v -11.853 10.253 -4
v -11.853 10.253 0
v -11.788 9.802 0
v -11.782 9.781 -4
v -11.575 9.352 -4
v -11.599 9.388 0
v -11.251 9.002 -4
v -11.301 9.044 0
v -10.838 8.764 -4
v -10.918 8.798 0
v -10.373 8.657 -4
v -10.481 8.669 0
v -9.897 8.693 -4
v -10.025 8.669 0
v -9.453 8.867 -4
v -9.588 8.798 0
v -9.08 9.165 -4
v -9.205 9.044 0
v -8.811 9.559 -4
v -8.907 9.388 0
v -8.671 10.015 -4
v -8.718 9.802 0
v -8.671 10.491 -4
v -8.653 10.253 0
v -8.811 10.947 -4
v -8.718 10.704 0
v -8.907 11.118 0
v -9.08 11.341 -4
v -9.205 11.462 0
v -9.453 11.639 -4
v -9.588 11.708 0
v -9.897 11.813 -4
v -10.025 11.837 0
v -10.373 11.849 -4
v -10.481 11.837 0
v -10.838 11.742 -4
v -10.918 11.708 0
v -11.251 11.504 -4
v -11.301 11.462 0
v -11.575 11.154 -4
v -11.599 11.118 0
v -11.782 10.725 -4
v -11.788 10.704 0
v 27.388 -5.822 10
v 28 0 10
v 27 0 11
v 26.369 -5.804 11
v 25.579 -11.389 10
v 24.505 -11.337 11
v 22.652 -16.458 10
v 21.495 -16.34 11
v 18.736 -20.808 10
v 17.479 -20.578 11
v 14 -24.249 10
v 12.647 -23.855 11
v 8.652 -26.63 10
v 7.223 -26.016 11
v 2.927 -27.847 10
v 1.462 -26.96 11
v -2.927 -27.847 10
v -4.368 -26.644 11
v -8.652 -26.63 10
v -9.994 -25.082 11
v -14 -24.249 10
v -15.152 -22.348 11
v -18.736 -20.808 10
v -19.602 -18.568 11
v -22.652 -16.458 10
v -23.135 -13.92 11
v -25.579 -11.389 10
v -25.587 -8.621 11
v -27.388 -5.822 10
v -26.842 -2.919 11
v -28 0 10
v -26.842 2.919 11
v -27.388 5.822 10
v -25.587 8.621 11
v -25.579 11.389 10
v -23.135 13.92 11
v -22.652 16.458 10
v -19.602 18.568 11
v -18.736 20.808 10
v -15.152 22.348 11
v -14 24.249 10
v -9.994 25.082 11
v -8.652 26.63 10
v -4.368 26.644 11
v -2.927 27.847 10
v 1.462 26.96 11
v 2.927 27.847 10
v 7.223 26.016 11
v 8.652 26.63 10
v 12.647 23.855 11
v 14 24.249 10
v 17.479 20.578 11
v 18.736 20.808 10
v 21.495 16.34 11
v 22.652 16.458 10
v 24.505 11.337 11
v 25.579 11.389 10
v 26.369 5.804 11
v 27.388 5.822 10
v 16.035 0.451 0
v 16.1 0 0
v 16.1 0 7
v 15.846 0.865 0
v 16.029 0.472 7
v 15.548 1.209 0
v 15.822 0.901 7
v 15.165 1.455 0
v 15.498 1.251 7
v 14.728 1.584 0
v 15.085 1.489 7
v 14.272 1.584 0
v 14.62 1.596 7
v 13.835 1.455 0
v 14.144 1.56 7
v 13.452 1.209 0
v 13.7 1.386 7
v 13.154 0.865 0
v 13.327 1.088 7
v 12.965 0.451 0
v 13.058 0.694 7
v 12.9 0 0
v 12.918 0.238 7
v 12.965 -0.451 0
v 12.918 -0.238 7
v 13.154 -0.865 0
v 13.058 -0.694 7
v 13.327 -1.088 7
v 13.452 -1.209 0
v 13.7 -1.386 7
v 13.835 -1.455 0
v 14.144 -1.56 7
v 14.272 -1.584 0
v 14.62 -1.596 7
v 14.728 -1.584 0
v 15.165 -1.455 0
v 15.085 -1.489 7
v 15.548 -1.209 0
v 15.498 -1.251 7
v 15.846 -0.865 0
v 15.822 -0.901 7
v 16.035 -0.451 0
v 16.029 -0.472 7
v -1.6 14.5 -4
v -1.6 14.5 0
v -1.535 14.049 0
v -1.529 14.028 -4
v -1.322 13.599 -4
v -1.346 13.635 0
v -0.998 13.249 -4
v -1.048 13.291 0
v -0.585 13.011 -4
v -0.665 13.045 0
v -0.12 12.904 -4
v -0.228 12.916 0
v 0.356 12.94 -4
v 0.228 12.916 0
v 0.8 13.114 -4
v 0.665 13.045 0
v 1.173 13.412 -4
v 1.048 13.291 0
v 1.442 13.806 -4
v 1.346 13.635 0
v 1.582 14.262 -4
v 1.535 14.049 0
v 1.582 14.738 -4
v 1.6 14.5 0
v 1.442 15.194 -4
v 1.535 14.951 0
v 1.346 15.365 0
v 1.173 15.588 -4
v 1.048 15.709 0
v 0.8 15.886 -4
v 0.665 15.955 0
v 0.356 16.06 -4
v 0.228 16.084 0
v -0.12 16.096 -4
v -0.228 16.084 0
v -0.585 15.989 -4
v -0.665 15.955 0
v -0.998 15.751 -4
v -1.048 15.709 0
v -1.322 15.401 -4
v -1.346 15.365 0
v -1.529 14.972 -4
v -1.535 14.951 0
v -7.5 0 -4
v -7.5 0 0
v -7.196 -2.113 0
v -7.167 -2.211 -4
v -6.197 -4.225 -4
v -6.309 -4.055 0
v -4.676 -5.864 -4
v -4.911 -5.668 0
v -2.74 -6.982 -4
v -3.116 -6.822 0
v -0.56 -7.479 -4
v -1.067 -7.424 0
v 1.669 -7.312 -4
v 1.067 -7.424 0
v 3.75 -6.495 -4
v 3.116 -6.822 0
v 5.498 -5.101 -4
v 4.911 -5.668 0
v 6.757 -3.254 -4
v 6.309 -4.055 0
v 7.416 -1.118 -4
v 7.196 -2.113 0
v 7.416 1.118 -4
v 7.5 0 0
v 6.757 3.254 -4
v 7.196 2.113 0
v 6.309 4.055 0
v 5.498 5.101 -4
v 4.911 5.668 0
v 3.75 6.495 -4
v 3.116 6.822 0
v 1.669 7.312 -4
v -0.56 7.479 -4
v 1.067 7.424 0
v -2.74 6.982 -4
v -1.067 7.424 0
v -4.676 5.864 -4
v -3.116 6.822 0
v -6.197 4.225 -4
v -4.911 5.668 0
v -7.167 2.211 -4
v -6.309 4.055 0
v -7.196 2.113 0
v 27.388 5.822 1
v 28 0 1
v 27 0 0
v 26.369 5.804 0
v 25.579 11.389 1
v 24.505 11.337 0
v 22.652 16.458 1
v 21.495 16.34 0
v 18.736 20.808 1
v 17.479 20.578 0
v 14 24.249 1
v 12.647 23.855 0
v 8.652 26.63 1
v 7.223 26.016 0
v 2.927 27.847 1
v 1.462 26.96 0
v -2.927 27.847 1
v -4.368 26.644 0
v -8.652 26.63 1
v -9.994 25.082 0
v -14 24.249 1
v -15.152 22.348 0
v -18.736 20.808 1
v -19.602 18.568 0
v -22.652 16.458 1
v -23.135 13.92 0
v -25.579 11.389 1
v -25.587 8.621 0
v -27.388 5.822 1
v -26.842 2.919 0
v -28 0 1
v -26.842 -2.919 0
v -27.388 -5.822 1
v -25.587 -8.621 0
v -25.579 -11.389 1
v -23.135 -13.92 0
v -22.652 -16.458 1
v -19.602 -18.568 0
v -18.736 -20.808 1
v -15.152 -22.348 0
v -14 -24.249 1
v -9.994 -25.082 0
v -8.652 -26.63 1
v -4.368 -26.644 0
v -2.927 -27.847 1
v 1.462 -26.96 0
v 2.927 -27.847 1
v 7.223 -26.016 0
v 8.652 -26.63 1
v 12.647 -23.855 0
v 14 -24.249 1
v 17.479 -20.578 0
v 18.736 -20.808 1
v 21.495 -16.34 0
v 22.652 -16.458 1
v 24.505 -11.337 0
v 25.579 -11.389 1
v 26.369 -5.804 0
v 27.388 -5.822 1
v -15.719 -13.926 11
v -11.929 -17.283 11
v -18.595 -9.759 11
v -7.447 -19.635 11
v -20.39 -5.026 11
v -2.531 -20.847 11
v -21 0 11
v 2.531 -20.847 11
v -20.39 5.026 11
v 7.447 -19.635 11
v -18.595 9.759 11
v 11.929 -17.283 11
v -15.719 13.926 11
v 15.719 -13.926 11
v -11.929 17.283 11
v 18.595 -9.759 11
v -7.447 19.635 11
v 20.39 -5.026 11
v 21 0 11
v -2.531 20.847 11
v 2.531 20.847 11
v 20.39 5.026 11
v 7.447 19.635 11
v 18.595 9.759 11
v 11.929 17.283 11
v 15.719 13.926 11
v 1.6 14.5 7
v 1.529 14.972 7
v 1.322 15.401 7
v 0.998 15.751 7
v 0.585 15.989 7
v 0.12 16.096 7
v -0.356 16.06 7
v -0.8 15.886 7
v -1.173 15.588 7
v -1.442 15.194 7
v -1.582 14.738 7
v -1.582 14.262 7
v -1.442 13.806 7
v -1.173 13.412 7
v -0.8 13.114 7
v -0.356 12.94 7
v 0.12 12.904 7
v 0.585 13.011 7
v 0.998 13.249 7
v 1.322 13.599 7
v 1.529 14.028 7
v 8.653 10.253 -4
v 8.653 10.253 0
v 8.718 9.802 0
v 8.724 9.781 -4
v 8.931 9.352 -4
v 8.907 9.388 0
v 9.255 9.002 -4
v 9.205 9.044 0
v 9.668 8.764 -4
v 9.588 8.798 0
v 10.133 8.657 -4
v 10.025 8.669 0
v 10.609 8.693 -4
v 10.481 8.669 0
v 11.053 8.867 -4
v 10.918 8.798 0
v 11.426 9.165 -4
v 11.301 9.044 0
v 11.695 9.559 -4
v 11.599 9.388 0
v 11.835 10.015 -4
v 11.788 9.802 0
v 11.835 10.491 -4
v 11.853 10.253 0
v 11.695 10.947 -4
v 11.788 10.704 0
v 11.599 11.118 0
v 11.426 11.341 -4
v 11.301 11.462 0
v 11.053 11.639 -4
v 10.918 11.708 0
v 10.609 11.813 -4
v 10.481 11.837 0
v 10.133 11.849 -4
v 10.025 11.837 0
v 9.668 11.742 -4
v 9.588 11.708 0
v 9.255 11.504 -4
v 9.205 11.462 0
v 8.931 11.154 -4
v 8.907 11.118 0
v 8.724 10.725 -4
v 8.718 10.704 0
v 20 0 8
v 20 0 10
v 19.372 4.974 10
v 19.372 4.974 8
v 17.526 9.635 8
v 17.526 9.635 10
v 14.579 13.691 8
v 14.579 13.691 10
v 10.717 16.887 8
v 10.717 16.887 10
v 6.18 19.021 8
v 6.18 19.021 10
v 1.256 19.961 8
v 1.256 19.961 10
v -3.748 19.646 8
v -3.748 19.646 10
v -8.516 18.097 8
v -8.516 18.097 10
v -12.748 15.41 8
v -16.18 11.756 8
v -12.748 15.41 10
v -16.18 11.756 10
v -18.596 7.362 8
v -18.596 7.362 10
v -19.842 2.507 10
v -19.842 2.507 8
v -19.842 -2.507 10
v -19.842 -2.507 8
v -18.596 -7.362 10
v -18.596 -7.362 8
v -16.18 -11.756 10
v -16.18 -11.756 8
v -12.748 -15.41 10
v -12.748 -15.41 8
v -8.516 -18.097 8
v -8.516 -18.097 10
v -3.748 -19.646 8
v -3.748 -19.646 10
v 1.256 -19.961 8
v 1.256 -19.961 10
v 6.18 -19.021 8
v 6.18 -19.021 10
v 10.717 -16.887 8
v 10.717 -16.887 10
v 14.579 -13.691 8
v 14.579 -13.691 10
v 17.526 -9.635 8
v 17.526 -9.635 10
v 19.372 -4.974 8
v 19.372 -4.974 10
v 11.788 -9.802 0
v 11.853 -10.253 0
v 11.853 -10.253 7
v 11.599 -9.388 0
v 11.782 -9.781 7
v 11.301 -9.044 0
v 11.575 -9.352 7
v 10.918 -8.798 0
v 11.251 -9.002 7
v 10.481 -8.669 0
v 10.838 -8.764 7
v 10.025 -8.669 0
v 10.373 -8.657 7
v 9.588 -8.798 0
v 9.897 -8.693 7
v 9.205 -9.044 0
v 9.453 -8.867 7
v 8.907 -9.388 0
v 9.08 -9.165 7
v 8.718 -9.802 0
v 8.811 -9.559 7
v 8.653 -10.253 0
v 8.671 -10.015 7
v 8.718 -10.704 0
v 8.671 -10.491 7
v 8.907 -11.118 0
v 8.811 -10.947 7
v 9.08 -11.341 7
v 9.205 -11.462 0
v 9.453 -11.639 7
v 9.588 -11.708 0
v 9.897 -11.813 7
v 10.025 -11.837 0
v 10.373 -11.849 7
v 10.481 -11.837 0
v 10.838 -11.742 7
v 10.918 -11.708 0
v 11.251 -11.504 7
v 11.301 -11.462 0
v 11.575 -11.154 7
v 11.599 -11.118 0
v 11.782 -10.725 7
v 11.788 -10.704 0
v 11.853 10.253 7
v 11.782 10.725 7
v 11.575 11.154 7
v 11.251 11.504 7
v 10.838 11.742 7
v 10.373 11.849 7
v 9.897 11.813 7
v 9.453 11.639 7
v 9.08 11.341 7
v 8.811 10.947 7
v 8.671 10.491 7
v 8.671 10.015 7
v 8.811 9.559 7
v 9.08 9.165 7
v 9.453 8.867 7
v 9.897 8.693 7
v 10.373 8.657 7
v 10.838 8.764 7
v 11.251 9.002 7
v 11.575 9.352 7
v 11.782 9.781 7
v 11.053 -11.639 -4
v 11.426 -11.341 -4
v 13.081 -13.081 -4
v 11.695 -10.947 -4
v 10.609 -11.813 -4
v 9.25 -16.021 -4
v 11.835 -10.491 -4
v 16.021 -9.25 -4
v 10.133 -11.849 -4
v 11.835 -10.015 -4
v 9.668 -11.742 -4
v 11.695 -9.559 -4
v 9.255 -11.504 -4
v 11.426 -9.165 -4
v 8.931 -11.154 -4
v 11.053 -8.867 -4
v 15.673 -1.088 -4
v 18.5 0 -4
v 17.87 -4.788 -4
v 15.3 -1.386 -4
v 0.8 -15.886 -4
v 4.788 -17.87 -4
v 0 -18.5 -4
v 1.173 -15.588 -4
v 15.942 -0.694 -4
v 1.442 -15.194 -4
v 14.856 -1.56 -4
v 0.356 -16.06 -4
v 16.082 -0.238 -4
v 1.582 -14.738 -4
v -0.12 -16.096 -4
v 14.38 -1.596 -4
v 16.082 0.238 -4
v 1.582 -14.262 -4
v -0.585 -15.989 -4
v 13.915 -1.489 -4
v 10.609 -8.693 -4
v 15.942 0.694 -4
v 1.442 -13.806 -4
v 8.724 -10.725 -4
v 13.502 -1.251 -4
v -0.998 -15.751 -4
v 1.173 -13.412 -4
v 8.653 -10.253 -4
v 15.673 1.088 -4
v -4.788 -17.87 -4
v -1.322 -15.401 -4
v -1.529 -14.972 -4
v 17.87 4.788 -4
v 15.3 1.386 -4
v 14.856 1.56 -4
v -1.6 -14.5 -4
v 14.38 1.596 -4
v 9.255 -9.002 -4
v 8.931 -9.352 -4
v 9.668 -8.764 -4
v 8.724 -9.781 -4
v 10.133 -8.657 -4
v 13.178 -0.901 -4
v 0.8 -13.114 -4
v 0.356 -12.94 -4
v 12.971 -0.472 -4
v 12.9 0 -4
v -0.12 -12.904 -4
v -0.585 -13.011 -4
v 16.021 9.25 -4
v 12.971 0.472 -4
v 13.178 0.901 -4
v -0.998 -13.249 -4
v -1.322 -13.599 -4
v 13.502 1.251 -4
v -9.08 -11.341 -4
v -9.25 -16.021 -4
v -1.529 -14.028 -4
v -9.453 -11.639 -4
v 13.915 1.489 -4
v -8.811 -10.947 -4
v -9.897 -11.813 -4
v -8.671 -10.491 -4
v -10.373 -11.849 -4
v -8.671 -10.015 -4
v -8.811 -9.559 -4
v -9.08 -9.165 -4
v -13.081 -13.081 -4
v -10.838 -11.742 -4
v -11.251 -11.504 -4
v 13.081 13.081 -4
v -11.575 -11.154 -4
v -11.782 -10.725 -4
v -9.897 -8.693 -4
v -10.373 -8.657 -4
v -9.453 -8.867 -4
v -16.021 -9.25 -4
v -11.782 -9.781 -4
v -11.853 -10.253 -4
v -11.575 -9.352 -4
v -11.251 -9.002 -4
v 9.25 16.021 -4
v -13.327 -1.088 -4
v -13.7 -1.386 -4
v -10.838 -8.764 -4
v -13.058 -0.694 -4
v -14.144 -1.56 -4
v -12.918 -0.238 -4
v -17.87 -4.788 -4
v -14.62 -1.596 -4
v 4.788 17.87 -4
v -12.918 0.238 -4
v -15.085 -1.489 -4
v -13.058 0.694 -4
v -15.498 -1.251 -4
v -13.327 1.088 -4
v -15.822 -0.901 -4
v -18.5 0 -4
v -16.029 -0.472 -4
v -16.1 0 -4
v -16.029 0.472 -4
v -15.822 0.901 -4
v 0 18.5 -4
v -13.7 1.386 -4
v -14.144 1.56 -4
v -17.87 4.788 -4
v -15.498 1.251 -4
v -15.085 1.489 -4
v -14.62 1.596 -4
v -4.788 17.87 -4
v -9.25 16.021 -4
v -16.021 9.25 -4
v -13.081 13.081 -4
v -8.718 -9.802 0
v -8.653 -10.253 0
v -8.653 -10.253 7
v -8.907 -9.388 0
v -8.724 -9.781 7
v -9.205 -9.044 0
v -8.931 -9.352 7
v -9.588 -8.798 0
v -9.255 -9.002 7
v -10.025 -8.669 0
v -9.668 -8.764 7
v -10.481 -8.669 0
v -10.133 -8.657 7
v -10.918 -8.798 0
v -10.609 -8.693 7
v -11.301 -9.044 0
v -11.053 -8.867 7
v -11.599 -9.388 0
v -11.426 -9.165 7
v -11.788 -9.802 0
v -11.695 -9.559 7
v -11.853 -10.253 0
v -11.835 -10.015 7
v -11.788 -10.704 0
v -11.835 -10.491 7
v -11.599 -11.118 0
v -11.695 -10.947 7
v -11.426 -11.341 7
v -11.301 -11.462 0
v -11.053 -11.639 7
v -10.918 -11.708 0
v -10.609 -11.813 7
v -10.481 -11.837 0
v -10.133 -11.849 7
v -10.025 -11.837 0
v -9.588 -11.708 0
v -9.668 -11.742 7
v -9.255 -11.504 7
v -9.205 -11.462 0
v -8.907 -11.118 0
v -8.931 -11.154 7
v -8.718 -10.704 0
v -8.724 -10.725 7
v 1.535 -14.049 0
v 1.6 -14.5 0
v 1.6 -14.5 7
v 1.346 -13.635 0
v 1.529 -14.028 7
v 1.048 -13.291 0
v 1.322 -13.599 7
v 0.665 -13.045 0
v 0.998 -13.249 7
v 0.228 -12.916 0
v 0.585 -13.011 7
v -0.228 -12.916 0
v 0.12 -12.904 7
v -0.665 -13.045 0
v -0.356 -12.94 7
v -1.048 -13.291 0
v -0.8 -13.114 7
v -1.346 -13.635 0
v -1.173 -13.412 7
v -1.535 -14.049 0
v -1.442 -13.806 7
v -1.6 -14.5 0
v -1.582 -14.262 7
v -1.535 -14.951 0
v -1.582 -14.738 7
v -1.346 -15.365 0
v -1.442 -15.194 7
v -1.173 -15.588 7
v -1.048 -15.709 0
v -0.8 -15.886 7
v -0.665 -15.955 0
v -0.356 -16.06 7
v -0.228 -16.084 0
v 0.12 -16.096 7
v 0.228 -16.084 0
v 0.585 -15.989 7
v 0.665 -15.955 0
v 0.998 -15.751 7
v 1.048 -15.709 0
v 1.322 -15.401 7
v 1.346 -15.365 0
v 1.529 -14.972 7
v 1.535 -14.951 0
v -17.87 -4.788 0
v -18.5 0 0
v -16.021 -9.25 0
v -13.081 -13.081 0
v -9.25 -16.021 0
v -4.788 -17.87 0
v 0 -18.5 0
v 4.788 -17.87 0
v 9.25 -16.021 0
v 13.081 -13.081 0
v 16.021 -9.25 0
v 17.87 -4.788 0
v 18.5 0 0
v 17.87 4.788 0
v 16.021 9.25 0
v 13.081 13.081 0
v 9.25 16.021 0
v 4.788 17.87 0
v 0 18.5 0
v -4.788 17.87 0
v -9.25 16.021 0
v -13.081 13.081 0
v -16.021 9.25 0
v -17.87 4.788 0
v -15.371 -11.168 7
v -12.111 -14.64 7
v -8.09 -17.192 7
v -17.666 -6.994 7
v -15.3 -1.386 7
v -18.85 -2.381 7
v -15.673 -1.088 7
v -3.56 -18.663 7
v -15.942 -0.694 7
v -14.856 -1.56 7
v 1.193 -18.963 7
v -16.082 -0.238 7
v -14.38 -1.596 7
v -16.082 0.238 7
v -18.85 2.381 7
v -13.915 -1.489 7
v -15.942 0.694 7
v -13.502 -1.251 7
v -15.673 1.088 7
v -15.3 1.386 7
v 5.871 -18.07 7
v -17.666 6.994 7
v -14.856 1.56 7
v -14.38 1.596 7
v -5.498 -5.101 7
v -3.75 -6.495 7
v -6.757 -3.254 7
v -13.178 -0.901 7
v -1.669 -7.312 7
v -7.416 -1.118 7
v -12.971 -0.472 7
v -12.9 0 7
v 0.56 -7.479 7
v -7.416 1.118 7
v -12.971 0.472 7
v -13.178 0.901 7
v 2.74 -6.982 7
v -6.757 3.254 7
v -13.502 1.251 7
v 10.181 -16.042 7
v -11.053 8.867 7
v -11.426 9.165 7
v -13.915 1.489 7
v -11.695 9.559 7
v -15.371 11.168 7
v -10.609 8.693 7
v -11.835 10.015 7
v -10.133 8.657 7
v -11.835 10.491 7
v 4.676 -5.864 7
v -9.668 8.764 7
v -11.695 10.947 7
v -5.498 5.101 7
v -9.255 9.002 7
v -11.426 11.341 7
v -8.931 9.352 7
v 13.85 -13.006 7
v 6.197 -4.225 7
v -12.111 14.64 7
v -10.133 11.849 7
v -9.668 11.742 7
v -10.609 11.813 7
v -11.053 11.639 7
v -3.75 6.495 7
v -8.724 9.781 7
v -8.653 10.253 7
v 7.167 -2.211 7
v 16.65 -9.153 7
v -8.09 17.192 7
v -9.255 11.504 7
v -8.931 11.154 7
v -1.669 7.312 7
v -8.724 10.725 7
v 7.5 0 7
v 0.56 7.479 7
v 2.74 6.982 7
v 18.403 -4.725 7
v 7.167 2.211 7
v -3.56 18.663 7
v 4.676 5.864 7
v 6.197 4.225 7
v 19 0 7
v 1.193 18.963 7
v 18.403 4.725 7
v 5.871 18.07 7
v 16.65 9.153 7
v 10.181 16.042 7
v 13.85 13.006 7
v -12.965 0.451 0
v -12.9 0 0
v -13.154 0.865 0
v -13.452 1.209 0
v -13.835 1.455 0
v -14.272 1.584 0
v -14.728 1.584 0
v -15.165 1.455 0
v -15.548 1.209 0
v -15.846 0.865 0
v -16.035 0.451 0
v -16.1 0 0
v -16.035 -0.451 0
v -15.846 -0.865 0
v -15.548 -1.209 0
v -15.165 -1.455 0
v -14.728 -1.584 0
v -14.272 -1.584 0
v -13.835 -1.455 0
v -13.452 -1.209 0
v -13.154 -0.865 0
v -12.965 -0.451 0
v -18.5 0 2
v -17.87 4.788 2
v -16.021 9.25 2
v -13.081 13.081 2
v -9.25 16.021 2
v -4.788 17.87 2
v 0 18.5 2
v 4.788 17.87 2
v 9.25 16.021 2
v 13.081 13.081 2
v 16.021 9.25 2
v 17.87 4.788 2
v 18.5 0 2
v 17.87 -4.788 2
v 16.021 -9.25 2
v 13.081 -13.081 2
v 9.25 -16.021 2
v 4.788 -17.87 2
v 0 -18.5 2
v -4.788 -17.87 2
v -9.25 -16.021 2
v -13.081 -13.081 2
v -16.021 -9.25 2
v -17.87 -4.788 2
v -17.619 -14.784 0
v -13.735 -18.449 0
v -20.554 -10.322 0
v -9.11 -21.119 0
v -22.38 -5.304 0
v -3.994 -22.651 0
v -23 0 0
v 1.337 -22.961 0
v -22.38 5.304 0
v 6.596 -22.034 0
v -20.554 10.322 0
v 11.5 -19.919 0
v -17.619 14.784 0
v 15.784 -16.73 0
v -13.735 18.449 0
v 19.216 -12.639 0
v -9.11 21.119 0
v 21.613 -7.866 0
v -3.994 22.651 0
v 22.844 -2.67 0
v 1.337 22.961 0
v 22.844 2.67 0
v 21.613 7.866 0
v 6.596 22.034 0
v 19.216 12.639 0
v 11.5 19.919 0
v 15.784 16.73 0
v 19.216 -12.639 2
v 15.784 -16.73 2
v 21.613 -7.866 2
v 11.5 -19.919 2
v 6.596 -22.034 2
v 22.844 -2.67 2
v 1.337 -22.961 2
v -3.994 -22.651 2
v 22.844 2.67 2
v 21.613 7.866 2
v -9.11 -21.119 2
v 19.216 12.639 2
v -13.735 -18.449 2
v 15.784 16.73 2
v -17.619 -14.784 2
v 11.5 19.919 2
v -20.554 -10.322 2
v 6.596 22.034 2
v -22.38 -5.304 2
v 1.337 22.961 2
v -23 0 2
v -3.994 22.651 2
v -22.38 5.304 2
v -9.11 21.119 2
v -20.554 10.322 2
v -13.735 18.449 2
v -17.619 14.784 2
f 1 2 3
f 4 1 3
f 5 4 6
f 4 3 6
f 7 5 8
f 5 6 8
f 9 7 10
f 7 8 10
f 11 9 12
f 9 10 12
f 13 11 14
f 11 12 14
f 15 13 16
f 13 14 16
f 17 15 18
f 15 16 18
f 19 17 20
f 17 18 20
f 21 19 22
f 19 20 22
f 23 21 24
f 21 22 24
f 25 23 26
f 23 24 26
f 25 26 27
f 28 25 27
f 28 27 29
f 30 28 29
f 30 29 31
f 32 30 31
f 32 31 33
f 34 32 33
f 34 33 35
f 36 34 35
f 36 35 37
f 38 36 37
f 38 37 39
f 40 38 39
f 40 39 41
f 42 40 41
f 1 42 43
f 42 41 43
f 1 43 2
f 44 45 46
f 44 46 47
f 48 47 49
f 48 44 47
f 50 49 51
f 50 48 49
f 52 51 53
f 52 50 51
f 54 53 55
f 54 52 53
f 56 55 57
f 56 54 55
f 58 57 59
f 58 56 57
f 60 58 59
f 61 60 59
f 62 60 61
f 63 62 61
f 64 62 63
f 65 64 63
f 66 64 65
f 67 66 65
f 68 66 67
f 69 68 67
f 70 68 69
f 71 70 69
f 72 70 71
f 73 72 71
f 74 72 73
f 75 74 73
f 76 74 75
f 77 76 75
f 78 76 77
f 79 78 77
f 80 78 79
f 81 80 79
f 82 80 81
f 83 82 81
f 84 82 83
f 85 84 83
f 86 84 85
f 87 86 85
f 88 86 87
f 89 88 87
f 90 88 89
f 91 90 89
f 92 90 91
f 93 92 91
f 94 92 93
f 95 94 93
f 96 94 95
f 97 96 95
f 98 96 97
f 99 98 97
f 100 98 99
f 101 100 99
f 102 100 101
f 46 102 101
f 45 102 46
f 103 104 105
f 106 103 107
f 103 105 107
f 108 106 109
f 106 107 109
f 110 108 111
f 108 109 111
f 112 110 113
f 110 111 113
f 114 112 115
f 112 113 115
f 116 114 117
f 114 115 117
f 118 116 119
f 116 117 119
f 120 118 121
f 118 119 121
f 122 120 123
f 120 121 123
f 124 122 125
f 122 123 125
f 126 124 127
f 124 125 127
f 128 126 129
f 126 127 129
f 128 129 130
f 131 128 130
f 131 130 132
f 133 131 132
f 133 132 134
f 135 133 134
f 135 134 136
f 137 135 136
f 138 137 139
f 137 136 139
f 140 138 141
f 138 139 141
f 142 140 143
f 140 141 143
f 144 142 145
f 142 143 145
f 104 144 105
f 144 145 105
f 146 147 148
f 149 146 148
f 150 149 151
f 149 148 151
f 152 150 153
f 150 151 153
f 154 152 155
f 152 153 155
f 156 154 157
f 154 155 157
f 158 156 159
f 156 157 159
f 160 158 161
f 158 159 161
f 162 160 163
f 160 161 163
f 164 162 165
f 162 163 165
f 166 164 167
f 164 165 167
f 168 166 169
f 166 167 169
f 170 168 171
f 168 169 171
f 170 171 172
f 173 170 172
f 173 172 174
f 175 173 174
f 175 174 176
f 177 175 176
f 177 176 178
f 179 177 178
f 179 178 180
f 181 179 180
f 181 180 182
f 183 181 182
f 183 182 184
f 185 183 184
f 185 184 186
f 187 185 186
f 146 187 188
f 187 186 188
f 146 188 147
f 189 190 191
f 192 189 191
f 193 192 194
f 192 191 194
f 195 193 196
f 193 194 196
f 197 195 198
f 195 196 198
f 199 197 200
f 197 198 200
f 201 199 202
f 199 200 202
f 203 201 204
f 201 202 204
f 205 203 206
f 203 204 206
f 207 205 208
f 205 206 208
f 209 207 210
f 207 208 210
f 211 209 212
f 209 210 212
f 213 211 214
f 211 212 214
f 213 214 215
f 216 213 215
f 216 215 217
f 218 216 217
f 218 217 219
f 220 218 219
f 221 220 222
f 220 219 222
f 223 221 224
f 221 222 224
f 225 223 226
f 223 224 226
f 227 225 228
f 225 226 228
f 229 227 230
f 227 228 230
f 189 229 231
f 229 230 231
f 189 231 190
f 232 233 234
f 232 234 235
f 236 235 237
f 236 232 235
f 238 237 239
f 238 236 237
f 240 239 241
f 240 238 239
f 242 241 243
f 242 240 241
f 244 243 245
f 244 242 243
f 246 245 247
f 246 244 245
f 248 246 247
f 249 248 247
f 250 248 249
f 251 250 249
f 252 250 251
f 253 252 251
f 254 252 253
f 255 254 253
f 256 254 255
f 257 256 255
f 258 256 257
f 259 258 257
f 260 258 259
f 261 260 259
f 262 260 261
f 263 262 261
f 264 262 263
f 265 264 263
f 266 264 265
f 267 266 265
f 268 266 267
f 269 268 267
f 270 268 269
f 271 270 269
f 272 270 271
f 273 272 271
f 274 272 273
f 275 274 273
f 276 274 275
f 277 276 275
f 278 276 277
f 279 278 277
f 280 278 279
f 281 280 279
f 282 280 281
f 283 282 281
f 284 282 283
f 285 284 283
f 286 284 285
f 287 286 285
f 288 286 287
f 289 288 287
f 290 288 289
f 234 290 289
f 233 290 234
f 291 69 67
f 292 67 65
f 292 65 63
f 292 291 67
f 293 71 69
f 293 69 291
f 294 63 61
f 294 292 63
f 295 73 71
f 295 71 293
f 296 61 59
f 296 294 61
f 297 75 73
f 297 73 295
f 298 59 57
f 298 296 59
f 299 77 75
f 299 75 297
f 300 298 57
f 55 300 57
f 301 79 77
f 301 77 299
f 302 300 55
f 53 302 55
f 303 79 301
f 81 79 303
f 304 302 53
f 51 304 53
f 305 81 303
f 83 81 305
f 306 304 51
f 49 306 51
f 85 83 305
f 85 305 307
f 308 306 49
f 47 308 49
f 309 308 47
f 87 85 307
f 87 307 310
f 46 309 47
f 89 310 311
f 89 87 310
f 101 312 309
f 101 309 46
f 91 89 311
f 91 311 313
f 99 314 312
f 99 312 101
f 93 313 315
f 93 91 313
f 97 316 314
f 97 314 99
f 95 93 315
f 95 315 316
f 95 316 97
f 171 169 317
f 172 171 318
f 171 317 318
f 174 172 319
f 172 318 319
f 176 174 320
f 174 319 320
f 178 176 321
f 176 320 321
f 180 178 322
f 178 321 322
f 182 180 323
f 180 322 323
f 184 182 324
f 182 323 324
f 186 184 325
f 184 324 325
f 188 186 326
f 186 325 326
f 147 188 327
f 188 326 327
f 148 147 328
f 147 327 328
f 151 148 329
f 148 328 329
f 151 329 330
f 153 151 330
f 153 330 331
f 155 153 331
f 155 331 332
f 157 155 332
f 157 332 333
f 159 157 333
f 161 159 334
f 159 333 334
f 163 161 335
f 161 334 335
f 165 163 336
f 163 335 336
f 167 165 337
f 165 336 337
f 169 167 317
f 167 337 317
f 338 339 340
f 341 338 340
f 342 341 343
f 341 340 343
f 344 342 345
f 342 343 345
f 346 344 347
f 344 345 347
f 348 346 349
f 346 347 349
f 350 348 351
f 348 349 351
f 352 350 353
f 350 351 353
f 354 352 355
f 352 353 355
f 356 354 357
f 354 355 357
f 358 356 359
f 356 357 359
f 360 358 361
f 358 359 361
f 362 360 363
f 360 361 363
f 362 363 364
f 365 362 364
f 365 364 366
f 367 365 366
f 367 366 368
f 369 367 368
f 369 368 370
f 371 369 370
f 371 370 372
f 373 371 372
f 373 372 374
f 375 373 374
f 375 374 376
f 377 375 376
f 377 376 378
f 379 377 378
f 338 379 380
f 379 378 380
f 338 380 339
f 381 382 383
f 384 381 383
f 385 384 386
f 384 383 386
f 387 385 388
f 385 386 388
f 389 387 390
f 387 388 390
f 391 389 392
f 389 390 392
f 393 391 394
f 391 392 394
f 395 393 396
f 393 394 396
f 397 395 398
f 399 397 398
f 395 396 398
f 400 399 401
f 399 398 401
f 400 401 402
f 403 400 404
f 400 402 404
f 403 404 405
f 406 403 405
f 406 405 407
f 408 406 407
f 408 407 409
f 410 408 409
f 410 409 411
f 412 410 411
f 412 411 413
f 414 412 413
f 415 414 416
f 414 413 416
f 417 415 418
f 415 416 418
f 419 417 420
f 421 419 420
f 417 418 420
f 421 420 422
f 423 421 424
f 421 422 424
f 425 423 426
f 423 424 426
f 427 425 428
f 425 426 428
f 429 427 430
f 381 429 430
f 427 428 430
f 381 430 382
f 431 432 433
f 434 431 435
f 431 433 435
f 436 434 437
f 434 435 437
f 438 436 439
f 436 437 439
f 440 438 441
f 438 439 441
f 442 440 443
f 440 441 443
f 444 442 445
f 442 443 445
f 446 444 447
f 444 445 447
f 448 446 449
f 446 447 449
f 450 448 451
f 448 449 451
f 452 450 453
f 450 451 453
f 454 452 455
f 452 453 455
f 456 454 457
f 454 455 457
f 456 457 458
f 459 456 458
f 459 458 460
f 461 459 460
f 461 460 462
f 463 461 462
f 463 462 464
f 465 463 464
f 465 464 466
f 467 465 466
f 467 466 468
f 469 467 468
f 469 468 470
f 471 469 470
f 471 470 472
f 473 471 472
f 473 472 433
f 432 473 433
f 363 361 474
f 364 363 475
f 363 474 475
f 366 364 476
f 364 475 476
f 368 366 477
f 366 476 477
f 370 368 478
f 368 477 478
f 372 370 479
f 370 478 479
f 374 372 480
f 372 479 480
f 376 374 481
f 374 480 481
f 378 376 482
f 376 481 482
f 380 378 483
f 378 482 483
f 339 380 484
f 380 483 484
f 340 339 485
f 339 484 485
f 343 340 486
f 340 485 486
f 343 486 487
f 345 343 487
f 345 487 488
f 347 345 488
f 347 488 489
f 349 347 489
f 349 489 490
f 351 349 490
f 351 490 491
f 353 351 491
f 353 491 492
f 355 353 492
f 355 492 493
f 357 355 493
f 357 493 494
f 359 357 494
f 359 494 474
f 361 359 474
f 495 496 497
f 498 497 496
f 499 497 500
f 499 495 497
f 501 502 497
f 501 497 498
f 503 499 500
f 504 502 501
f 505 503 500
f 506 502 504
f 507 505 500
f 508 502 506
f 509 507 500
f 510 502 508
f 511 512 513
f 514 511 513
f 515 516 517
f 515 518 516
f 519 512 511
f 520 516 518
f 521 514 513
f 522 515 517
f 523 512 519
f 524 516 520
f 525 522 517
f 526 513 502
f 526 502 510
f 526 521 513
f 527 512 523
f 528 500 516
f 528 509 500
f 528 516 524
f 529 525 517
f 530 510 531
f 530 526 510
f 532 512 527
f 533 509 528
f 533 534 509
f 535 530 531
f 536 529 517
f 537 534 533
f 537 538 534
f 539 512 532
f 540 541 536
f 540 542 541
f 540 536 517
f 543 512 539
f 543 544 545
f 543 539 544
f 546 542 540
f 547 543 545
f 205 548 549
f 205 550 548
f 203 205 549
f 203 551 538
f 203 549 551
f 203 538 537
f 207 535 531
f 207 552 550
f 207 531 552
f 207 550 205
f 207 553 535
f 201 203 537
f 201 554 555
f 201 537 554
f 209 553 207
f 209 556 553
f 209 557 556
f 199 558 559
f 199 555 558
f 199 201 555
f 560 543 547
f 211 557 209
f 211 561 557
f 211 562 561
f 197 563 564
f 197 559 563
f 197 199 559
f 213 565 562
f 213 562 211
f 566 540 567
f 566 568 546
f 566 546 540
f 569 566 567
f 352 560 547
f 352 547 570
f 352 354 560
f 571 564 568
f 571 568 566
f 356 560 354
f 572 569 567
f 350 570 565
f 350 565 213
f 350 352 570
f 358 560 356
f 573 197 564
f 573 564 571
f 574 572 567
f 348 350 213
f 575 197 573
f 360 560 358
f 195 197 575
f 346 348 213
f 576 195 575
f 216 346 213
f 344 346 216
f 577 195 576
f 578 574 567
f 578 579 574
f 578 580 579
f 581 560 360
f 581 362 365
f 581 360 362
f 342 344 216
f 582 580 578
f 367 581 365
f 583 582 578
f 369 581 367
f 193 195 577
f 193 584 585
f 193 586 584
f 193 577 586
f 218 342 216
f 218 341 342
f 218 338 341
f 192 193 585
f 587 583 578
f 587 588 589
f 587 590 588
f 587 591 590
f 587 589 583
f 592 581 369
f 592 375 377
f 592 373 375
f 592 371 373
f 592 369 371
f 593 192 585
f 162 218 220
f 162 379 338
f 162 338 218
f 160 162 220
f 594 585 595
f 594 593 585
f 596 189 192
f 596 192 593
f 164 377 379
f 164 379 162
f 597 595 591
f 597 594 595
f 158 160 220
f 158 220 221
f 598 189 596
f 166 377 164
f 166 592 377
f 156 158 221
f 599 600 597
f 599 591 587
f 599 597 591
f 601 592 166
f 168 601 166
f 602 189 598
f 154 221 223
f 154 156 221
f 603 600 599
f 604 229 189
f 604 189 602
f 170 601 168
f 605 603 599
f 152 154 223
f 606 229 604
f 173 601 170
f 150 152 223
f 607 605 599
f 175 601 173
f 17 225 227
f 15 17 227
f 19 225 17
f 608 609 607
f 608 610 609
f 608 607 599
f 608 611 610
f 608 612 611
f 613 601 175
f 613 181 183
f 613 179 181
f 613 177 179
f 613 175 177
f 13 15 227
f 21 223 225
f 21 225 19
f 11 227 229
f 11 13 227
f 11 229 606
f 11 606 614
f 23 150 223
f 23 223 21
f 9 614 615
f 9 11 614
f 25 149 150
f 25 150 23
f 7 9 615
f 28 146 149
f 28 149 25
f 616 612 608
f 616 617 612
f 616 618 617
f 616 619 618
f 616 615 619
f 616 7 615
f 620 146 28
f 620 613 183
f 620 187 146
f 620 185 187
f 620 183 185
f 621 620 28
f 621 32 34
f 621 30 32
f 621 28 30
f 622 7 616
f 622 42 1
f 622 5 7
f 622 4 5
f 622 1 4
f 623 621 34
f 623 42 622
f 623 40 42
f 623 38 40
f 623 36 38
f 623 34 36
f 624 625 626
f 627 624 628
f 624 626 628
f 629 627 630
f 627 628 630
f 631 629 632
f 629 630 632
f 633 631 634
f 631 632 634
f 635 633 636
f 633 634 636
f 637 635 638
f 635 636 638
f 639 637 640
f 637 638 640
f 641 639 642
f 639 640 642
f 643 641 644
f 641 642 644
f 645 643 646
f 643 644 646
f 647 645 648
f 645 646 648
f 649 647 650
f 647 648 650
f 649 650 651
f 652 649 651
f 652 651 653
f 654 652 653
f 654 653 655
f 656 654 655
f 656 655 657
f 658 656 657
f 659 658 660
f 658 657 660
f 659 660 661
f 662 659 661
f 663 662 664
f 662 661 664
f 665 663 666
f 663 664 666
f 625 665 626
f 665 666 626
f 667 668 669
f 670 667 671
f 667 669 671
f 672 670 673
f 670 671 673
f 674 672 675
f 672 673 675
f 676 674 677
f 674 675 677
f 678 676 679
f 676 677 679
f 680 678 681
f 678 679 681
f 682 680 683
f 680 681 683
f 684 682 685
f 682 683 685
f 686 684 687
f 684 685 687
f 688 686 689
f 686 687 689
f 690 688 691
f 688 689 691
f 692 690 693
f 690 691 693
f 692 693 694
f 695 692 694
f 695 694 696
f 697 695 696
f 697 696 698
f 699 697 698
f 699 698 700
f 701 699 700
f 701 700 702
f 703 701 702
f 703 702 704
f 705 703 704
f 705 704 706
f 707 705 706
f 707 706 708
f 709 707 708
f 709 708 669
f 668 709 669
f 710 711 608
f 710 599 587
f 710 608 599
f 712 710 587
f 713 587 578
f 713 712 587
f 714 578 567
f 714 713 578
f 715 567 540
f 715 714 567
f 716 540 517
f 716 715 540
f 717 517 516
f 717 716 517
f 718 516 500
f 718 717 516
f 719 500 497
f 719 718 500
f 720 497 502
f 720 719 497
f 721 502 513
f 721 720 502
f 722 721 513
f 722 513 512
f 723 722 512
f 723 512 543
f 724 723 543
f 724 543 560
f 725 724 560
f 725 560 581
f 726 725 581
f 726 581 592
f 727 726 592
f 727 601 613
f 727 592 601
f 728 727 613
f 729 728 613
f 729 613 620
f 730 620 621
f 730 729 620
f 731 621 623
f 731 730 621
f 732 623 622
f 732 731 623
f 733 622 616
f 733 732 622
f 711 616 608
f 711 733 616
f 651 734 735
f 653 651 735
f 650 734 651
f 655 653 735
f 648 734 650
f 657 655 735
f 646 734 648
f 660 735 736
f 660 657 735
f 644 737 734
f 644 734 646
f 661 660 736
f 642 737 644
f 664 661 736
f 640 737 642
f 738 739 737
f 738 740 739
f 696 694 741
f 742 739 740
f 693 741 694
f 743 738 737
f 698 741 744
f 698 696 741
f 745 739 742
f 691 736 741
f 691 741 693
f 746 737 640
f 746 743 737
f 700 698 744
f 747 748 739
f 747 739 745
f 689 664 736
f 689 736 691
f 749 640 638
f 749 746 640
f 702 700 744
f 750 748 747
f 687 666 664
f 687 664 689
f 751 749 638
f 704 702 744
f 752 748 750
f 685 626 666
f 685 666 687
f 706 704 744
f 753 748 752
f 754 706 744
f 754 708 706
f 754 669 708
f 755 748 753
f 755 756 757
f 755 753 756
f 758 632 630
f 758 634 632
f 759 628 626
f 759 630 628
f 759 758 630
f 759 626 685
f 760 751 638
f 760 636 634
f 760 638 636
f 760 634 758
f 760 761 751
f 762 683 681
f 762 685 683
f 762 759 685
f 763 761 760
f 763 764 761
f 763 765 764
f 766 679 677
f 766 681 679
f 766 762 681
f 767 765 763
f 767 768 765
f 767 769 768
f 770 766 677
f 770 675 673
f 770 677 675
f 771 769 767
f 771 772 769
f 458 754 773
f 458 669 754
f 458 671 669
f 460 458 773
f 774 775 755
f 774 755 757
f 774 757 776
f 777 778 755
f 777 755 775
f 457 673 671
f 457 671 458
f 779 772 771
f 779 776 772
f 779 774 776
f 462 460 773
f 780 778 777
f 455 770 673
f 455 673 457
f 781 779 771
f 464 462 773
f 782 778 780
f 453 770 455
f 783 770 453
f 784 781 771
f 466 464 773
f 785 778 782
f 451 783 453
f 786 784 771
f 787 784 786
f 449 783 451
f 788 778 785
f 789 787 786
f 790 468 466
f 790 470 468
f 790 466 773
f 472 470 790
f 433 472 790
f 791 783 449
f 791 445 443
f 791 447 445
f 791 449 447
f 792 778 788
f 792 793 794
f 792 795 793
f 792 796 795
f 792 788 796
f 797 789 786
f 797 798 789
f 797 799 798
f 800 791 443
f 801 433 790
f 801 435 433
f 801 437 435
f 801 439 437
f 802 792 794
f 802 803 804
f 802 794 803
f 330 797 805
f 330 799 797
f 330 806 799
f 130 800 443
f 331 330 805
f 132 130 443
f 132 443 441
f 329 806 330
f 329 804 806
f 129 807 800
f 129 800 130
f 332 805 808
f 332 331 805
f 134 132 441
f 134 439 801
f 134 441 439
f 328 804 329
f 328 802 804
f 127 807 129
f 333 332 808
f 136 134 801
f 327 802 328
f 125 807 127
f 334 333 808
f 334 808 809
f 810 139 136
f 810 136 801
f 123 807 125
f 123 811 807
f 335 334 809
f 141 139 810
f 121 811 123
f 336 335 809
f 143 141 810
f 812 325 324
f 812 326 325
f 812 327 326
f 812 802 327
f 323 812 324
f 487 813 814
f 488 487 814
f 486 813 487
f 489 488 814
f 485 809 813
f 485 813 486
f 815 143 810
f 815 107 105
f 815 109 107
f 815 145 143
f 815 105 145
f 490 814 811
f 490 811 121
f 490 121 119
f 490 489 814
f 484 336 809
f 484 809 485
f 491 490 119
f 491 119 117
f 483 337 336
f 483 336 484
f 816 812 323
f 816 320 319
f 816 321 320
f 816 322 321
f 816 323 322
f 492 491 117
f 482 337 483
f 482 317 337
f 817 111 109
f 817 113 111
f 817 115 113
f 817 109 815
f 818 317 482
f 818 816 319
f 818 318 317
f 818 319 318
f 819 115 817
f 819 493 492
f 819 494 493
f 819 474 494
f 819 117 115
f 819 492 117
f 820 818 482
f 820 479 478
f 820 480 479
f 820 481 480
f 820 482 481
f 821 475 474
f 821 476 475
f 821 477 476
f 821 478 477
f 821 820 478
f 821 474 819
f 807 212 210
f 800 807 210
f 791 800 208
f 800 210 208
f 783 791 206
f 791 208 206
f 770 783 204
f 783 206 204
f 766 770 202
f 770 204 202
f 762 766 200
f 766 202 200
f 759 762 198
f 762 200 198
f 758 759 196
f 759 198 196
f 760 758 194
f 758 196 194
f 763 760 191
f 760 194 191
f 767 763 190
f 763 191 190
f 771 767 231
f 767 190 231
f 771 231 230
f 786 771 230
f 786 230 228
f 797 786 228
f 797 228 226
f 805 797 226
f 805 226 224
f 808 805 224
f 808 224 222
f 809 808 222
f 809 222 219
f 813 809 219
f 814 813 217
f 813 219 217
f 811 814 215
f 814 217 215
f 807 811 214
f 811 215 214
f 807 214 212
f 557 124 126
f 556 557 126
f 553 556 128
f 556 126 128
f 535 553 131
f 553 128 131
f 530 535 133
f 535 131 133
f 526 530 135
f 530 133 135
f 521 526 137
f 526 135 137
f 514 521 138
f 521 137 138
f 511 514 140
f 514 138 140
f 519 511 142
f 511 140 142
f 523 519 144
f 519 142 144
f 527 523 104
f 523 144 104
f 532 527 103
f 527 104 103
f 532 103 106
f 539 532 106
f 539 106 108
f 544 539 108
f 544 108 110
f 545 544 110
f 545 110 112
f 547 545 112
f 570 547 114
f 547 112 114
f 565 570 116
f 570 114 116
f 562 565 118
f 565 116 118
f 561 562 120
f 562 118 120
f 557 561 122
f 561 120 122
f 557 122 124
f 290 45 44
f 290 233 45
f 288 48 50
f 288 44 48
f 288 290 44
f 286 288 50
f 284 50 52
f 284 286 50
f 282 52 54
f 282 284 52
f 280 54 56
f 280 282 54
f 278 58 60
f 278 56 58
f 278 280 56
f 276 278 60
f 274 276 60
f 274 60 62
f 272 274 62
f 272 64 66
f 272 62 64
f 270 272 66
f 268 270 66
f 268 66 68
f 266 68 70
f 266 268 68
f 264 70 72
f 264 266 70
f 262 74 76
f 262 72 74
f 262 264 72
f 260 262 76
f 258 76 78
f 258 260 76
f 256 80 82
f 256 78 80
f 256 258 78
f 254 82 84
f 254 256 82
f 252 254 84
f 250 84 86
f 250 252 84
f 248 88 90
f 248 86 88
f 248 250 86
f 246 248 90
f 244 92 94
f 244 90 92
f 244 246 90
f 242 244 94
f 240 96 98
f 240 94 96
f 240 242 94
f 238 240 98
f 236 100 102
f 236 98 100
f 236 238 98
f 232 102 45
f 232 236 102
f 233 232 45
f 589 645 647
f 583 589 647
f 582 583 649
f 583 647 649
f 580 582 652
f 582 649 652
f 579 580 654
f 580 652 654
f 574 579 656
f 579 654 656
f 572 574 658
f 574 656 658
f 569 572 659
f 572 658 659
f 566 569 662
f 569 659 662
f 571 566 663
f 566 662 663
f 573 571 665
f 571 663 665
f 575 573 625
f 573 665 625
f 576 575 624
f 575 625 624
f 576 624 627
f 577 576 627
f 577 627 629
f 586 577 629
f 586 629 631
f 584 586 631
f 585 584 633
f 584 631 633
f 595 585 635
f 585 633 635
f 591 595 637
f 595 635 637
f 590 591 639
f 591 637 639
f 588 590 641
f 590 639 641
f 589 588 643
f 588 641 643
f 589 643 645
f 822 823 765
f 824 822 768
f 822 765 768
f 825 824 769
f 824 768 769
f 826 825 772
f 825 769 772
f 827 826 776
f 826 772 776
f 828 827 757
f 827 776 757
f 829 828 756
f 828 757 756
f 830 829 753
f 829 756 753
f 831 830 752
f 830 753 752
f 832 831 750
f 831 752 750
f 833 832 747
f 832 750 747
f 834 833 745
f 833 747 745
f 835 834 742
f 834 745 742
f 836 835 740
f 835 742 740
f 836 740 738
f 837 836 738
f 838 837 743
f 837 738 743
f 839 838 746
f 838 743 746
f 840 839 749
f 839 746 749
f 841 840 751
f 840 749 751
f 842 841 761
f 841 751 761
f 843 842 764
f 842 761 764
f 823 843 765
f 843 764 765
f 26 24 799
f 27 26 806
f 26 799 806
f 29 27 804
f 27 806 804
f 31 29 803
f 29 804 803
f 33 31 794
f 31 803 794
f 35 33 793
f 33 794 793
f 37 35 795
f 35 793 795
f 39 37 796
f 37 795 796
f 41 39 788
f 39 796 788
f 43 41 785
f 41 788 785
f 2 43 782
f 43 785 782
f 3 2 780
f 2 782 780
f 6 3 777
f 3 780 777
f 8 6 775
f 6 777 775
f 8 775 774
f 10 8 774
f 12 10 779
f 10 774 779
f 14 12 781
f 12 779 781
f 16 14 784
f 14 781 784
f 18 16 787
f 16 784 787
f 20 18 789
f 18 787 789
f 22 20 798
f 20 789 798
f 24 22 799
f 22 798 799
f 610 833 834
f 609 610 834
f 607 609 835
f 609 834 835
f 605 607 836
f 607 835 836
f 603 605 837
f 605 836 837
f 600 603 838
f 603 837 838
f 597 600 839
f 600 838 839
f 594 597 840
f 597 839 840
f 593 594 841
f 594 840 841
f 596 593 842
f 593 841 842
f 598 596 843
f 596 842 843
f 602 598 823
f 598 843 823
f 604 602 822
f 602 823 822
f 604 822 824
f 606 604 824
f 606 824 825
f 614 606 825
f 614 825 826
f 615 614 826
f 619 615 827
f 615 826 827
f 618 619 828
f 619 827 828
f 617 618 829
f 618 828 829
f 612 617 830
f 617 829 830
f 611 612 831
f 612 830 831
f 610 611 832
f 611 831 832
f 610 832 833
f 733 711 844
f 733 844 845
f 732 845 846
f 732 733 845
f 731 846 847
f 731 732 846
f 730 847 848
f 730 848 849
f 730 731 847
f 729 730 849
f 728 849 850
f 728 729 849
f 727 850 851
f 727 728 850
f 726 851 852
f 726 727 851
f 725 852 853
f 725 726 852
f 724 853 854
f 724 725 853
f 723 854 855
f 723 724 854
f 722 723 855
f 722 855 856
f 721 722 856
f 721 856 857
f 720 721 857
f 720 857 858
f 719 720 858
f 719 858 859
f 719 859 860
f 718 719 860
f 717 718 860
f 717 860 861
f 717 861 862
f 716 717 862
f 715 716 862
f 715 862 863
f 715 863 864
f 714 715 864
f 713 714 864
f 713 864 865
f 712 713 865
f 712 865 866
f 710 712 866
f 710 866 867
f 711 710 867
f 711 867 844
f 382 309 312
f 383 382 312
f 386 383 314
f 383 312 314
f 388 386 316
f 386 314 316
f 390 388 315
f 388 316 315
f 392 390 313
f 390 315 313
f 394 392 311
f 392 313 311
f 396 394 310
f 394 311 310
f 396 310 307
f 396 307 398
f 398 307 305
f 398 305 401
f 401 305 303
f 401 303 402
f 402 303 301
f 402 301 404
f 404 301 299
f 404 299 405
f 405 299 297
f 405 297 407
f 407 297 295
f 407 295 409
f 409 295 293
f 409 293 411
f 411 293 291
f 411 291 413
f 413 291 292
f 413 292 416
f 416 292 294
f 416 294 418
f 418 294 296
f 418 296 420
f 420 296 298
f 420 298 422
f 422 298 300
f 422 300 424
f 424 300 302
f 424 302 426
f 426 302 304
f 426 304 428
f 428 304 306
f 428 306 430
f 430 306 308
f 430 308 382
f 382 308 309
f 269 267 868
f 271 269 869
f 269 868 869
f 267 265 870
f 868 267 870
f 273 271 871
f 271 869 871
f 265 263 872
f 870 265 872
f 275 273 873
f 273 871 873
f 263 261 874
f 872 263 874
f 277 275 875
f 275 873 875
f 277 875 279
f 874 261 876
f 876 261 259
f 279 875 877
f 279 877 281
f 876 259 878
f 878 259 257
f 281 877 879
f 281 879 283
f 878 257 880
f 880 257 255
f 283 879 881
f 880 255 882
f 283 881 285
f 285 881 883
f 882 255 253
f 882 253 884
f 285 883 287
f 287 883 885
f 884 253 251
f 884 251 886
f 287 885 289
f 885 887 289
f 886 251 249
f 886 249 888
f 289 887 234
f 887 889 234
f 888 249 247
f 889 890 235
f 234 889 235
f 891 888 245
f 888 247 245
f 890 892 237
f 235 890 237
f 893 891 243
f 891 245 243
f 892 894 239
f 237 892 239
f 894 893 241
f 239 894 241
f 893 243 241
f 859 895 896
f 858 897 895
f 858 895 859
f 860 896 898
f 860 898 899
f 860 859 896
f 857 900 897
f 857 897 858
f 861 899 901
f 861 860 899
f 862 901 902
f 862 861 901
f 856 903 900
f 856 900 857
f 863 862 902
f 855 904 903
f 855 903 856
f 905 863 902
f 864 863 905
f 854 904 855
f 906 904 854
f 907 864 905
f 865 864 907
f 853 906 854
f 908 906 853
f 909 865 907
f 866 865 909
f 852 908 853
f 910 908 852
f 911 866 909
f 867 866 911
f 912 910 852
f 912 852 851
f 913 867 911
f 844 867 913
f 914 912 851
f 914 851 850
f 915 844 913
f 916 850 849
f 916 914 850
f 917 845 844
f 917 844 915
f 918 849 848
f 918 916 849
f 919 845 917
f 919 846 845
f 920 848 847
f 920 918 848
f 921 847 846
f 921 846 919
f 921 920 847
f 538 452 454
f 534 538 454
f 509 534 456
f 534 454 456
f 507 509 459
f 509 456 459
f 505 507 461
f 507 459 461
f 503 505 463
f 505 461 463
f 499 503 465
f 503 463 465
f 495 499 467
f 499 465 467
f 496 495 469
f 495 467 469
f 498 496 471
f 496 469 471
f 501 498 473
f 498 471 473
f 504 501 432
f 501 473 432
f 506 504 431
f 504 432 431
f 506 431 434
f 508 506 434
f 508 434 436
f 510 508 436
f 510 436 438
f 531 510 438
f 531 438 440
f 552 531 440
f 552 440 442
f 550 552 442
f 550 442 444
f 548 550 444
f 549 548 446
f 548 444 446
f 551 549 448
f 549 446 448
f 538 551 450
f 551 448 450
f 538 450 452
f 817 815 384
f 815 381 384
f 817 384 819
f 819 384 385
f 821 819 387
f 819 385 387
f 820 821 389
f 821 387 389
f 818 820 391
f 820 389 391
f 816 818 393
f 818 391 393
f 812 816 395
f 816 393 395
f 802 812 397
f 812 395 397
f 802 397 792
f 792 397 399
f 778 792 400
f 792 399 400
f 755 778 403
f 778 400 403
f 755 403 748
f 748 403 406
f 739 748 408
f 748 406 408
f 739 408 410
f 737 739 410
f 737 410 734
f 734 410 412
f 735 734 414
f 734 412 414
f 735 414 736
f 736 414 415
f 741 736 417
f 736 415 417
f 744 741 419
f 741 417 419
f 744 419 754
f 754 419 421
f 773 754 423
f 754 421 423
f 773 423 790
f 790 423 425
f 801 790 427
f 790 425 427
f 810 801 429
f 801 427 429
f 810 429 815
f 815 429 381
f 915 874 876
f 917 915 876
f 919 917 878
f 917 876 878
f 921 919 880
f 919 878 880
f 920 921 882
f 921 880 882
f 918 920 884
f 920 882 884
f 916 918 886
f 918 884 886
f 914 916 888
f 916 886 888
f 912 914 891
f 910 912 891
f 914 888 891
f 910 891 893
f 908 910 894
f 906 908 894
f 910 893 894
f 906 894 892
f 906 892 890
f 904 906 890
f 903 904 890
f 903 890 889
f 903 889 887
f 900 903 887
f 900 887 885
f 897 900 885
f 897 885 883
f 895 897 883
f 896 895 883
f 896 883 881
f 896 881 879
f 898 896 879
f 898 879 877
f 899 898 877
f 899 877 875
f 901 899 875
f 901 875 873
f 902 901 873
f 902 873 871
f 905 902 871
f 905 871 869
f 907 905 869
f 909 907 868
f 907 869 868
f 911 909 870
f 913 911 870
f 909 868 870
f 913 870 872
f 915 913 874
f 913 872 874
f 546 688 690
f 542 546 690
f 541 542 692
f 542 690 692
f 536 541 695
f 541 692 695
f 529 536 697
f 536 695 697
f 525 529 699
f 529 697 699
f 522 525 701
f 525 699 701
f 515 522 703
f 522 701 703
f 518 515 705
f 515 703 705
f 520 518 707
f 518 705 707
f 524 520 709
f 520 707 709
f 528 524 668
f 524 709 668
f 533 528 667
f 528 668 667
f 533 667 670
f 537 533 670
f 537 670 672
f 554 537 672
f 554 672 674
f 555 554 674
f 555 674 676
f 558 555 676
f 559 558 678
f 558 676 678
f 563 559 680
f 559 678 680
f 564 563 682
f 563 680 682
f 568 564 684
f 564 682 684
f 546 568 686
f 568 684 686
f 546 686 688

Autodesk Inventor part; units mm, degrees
ref_plane "YZ Plane" through (0, 0, 0) normal (1, 0, 0) x (0, 1, 0)
ref_plane "XZ Plane" through (0, 0, 0) normal (0, 1, 0) x (-1, 0, 0)
ref_plane "XY Plane" through (0, 0, 0) normal (0, 0, 1) x (1, 0, 0)
sketch "草图1" plane through (0, 0, 0) normal (0, 0, 1) x (1, 0, 0)
  circle A0 centre (0, 0) radius 28
  circle A1 centre (0, 0) radius 7.5
  dimension "d0" = 56
  dimension "d1" = 15
extrude "拉伸1" add sketch "草图1" along normal blind 9
sketch "草图2" plane through (0, 0, 9) normal (0, 0, 1) x (1, 0, 0)
  circle A0 centre (0, 0) radius 28 projected
  circle A1 centre (0, 0) radius 7.5
  dimension "d4" = 15
extrude "拉伸2" add sketch "草图2" along normal blind 2
sketch "草图3" plane through (0, 0, 11) normal (0, 0, 1) x (1, 0, 0)
  circle A0 centre (0, 0) radius 14.5 construction
  line L0 (-36.9419, 0) -> (43.6936, 0) construction
  circle A1 centre (14.5, 0) radius 1.6
  circle A2 centre (10.253, 10.253) radius 1.6
  circle A3 centre (0, 14.5) radius 1.6
  circle A4 centre (-10.253, 10.253) radius 1.6
  circle A5 centre (-14.5, 0) radius 1.6
  circle A6 centre (-10.253, -10.253) radius 1.6
  circle A7 centre (0, -14.5) radius 1.6
  circle A8 centre (10.253, -10.253) radius 1.6
  dimension "d7" = 29
  dimension "d8" = 3.2
  dimension "d11" = 360
extrude "拉伸3" cut sketch "草图3" against normal through all
chamfer "倒角1" distance 1 angle 45 2 edges at (-28, 0, 0) (-28, 0, 11)
sketch "草图4" plane through (0, 0, 0) normal (0, 0, -1) x (-1, 0, 0)
  circle A0 centre (0, 0) radius 18.5
  circle A1 centre (0, 0) radius 23
  dimension "d18" = 37
  dimension "d19" = 46
extrude "拉伸4" cut sketch "草图4" against normal blind 2
sketch "草图6" plane through (0, 0, 0) normal (0, 0, -1) x (-1, 0, 0)
  circle A0 centre (0, 0) radius 18.5 projected
  circle A1 centre (0, 0) radius 7.5 projected
  circle A2 centre (-14.5, 0) radius 1.6 projected
  circle A3 centre (-10.253, 10.253) radius 1.6 projected
  circle A4 centre (0, 14.5) radius 1.6 projected
  circle A5 centre (10.253, 10.253) radius 1.6 projected
  circle A6 centre (14.5, 0) radius 1.6 projected
  circle A7 centre (10.253, -10.253) radius 1.6 projected
  circle A8 centre (0, -14.5) radius 1.6 projected
  circle A9 centre (-10.253, -10.253) radius 1.6 projected
extrude "拉伸6" add sketch "草图6" along normal blind 4
sketch "草图7" plane through (0, 0, 11) normal (0, 0, 1) x (1, 0, 0)
  circle A0 centre (0, 0) radius 20
  circle A1 centre (0, 0) radius 7.5 projected
  dimension "d34" = 40
extrude "拉伸7" cut sketch "草图7" against normal blind 4
chamfer "倒角3" distance 1 angle 45 2 edges at (-20, 0, 11) (-20, 0, 7)
properties part number "内轮"
